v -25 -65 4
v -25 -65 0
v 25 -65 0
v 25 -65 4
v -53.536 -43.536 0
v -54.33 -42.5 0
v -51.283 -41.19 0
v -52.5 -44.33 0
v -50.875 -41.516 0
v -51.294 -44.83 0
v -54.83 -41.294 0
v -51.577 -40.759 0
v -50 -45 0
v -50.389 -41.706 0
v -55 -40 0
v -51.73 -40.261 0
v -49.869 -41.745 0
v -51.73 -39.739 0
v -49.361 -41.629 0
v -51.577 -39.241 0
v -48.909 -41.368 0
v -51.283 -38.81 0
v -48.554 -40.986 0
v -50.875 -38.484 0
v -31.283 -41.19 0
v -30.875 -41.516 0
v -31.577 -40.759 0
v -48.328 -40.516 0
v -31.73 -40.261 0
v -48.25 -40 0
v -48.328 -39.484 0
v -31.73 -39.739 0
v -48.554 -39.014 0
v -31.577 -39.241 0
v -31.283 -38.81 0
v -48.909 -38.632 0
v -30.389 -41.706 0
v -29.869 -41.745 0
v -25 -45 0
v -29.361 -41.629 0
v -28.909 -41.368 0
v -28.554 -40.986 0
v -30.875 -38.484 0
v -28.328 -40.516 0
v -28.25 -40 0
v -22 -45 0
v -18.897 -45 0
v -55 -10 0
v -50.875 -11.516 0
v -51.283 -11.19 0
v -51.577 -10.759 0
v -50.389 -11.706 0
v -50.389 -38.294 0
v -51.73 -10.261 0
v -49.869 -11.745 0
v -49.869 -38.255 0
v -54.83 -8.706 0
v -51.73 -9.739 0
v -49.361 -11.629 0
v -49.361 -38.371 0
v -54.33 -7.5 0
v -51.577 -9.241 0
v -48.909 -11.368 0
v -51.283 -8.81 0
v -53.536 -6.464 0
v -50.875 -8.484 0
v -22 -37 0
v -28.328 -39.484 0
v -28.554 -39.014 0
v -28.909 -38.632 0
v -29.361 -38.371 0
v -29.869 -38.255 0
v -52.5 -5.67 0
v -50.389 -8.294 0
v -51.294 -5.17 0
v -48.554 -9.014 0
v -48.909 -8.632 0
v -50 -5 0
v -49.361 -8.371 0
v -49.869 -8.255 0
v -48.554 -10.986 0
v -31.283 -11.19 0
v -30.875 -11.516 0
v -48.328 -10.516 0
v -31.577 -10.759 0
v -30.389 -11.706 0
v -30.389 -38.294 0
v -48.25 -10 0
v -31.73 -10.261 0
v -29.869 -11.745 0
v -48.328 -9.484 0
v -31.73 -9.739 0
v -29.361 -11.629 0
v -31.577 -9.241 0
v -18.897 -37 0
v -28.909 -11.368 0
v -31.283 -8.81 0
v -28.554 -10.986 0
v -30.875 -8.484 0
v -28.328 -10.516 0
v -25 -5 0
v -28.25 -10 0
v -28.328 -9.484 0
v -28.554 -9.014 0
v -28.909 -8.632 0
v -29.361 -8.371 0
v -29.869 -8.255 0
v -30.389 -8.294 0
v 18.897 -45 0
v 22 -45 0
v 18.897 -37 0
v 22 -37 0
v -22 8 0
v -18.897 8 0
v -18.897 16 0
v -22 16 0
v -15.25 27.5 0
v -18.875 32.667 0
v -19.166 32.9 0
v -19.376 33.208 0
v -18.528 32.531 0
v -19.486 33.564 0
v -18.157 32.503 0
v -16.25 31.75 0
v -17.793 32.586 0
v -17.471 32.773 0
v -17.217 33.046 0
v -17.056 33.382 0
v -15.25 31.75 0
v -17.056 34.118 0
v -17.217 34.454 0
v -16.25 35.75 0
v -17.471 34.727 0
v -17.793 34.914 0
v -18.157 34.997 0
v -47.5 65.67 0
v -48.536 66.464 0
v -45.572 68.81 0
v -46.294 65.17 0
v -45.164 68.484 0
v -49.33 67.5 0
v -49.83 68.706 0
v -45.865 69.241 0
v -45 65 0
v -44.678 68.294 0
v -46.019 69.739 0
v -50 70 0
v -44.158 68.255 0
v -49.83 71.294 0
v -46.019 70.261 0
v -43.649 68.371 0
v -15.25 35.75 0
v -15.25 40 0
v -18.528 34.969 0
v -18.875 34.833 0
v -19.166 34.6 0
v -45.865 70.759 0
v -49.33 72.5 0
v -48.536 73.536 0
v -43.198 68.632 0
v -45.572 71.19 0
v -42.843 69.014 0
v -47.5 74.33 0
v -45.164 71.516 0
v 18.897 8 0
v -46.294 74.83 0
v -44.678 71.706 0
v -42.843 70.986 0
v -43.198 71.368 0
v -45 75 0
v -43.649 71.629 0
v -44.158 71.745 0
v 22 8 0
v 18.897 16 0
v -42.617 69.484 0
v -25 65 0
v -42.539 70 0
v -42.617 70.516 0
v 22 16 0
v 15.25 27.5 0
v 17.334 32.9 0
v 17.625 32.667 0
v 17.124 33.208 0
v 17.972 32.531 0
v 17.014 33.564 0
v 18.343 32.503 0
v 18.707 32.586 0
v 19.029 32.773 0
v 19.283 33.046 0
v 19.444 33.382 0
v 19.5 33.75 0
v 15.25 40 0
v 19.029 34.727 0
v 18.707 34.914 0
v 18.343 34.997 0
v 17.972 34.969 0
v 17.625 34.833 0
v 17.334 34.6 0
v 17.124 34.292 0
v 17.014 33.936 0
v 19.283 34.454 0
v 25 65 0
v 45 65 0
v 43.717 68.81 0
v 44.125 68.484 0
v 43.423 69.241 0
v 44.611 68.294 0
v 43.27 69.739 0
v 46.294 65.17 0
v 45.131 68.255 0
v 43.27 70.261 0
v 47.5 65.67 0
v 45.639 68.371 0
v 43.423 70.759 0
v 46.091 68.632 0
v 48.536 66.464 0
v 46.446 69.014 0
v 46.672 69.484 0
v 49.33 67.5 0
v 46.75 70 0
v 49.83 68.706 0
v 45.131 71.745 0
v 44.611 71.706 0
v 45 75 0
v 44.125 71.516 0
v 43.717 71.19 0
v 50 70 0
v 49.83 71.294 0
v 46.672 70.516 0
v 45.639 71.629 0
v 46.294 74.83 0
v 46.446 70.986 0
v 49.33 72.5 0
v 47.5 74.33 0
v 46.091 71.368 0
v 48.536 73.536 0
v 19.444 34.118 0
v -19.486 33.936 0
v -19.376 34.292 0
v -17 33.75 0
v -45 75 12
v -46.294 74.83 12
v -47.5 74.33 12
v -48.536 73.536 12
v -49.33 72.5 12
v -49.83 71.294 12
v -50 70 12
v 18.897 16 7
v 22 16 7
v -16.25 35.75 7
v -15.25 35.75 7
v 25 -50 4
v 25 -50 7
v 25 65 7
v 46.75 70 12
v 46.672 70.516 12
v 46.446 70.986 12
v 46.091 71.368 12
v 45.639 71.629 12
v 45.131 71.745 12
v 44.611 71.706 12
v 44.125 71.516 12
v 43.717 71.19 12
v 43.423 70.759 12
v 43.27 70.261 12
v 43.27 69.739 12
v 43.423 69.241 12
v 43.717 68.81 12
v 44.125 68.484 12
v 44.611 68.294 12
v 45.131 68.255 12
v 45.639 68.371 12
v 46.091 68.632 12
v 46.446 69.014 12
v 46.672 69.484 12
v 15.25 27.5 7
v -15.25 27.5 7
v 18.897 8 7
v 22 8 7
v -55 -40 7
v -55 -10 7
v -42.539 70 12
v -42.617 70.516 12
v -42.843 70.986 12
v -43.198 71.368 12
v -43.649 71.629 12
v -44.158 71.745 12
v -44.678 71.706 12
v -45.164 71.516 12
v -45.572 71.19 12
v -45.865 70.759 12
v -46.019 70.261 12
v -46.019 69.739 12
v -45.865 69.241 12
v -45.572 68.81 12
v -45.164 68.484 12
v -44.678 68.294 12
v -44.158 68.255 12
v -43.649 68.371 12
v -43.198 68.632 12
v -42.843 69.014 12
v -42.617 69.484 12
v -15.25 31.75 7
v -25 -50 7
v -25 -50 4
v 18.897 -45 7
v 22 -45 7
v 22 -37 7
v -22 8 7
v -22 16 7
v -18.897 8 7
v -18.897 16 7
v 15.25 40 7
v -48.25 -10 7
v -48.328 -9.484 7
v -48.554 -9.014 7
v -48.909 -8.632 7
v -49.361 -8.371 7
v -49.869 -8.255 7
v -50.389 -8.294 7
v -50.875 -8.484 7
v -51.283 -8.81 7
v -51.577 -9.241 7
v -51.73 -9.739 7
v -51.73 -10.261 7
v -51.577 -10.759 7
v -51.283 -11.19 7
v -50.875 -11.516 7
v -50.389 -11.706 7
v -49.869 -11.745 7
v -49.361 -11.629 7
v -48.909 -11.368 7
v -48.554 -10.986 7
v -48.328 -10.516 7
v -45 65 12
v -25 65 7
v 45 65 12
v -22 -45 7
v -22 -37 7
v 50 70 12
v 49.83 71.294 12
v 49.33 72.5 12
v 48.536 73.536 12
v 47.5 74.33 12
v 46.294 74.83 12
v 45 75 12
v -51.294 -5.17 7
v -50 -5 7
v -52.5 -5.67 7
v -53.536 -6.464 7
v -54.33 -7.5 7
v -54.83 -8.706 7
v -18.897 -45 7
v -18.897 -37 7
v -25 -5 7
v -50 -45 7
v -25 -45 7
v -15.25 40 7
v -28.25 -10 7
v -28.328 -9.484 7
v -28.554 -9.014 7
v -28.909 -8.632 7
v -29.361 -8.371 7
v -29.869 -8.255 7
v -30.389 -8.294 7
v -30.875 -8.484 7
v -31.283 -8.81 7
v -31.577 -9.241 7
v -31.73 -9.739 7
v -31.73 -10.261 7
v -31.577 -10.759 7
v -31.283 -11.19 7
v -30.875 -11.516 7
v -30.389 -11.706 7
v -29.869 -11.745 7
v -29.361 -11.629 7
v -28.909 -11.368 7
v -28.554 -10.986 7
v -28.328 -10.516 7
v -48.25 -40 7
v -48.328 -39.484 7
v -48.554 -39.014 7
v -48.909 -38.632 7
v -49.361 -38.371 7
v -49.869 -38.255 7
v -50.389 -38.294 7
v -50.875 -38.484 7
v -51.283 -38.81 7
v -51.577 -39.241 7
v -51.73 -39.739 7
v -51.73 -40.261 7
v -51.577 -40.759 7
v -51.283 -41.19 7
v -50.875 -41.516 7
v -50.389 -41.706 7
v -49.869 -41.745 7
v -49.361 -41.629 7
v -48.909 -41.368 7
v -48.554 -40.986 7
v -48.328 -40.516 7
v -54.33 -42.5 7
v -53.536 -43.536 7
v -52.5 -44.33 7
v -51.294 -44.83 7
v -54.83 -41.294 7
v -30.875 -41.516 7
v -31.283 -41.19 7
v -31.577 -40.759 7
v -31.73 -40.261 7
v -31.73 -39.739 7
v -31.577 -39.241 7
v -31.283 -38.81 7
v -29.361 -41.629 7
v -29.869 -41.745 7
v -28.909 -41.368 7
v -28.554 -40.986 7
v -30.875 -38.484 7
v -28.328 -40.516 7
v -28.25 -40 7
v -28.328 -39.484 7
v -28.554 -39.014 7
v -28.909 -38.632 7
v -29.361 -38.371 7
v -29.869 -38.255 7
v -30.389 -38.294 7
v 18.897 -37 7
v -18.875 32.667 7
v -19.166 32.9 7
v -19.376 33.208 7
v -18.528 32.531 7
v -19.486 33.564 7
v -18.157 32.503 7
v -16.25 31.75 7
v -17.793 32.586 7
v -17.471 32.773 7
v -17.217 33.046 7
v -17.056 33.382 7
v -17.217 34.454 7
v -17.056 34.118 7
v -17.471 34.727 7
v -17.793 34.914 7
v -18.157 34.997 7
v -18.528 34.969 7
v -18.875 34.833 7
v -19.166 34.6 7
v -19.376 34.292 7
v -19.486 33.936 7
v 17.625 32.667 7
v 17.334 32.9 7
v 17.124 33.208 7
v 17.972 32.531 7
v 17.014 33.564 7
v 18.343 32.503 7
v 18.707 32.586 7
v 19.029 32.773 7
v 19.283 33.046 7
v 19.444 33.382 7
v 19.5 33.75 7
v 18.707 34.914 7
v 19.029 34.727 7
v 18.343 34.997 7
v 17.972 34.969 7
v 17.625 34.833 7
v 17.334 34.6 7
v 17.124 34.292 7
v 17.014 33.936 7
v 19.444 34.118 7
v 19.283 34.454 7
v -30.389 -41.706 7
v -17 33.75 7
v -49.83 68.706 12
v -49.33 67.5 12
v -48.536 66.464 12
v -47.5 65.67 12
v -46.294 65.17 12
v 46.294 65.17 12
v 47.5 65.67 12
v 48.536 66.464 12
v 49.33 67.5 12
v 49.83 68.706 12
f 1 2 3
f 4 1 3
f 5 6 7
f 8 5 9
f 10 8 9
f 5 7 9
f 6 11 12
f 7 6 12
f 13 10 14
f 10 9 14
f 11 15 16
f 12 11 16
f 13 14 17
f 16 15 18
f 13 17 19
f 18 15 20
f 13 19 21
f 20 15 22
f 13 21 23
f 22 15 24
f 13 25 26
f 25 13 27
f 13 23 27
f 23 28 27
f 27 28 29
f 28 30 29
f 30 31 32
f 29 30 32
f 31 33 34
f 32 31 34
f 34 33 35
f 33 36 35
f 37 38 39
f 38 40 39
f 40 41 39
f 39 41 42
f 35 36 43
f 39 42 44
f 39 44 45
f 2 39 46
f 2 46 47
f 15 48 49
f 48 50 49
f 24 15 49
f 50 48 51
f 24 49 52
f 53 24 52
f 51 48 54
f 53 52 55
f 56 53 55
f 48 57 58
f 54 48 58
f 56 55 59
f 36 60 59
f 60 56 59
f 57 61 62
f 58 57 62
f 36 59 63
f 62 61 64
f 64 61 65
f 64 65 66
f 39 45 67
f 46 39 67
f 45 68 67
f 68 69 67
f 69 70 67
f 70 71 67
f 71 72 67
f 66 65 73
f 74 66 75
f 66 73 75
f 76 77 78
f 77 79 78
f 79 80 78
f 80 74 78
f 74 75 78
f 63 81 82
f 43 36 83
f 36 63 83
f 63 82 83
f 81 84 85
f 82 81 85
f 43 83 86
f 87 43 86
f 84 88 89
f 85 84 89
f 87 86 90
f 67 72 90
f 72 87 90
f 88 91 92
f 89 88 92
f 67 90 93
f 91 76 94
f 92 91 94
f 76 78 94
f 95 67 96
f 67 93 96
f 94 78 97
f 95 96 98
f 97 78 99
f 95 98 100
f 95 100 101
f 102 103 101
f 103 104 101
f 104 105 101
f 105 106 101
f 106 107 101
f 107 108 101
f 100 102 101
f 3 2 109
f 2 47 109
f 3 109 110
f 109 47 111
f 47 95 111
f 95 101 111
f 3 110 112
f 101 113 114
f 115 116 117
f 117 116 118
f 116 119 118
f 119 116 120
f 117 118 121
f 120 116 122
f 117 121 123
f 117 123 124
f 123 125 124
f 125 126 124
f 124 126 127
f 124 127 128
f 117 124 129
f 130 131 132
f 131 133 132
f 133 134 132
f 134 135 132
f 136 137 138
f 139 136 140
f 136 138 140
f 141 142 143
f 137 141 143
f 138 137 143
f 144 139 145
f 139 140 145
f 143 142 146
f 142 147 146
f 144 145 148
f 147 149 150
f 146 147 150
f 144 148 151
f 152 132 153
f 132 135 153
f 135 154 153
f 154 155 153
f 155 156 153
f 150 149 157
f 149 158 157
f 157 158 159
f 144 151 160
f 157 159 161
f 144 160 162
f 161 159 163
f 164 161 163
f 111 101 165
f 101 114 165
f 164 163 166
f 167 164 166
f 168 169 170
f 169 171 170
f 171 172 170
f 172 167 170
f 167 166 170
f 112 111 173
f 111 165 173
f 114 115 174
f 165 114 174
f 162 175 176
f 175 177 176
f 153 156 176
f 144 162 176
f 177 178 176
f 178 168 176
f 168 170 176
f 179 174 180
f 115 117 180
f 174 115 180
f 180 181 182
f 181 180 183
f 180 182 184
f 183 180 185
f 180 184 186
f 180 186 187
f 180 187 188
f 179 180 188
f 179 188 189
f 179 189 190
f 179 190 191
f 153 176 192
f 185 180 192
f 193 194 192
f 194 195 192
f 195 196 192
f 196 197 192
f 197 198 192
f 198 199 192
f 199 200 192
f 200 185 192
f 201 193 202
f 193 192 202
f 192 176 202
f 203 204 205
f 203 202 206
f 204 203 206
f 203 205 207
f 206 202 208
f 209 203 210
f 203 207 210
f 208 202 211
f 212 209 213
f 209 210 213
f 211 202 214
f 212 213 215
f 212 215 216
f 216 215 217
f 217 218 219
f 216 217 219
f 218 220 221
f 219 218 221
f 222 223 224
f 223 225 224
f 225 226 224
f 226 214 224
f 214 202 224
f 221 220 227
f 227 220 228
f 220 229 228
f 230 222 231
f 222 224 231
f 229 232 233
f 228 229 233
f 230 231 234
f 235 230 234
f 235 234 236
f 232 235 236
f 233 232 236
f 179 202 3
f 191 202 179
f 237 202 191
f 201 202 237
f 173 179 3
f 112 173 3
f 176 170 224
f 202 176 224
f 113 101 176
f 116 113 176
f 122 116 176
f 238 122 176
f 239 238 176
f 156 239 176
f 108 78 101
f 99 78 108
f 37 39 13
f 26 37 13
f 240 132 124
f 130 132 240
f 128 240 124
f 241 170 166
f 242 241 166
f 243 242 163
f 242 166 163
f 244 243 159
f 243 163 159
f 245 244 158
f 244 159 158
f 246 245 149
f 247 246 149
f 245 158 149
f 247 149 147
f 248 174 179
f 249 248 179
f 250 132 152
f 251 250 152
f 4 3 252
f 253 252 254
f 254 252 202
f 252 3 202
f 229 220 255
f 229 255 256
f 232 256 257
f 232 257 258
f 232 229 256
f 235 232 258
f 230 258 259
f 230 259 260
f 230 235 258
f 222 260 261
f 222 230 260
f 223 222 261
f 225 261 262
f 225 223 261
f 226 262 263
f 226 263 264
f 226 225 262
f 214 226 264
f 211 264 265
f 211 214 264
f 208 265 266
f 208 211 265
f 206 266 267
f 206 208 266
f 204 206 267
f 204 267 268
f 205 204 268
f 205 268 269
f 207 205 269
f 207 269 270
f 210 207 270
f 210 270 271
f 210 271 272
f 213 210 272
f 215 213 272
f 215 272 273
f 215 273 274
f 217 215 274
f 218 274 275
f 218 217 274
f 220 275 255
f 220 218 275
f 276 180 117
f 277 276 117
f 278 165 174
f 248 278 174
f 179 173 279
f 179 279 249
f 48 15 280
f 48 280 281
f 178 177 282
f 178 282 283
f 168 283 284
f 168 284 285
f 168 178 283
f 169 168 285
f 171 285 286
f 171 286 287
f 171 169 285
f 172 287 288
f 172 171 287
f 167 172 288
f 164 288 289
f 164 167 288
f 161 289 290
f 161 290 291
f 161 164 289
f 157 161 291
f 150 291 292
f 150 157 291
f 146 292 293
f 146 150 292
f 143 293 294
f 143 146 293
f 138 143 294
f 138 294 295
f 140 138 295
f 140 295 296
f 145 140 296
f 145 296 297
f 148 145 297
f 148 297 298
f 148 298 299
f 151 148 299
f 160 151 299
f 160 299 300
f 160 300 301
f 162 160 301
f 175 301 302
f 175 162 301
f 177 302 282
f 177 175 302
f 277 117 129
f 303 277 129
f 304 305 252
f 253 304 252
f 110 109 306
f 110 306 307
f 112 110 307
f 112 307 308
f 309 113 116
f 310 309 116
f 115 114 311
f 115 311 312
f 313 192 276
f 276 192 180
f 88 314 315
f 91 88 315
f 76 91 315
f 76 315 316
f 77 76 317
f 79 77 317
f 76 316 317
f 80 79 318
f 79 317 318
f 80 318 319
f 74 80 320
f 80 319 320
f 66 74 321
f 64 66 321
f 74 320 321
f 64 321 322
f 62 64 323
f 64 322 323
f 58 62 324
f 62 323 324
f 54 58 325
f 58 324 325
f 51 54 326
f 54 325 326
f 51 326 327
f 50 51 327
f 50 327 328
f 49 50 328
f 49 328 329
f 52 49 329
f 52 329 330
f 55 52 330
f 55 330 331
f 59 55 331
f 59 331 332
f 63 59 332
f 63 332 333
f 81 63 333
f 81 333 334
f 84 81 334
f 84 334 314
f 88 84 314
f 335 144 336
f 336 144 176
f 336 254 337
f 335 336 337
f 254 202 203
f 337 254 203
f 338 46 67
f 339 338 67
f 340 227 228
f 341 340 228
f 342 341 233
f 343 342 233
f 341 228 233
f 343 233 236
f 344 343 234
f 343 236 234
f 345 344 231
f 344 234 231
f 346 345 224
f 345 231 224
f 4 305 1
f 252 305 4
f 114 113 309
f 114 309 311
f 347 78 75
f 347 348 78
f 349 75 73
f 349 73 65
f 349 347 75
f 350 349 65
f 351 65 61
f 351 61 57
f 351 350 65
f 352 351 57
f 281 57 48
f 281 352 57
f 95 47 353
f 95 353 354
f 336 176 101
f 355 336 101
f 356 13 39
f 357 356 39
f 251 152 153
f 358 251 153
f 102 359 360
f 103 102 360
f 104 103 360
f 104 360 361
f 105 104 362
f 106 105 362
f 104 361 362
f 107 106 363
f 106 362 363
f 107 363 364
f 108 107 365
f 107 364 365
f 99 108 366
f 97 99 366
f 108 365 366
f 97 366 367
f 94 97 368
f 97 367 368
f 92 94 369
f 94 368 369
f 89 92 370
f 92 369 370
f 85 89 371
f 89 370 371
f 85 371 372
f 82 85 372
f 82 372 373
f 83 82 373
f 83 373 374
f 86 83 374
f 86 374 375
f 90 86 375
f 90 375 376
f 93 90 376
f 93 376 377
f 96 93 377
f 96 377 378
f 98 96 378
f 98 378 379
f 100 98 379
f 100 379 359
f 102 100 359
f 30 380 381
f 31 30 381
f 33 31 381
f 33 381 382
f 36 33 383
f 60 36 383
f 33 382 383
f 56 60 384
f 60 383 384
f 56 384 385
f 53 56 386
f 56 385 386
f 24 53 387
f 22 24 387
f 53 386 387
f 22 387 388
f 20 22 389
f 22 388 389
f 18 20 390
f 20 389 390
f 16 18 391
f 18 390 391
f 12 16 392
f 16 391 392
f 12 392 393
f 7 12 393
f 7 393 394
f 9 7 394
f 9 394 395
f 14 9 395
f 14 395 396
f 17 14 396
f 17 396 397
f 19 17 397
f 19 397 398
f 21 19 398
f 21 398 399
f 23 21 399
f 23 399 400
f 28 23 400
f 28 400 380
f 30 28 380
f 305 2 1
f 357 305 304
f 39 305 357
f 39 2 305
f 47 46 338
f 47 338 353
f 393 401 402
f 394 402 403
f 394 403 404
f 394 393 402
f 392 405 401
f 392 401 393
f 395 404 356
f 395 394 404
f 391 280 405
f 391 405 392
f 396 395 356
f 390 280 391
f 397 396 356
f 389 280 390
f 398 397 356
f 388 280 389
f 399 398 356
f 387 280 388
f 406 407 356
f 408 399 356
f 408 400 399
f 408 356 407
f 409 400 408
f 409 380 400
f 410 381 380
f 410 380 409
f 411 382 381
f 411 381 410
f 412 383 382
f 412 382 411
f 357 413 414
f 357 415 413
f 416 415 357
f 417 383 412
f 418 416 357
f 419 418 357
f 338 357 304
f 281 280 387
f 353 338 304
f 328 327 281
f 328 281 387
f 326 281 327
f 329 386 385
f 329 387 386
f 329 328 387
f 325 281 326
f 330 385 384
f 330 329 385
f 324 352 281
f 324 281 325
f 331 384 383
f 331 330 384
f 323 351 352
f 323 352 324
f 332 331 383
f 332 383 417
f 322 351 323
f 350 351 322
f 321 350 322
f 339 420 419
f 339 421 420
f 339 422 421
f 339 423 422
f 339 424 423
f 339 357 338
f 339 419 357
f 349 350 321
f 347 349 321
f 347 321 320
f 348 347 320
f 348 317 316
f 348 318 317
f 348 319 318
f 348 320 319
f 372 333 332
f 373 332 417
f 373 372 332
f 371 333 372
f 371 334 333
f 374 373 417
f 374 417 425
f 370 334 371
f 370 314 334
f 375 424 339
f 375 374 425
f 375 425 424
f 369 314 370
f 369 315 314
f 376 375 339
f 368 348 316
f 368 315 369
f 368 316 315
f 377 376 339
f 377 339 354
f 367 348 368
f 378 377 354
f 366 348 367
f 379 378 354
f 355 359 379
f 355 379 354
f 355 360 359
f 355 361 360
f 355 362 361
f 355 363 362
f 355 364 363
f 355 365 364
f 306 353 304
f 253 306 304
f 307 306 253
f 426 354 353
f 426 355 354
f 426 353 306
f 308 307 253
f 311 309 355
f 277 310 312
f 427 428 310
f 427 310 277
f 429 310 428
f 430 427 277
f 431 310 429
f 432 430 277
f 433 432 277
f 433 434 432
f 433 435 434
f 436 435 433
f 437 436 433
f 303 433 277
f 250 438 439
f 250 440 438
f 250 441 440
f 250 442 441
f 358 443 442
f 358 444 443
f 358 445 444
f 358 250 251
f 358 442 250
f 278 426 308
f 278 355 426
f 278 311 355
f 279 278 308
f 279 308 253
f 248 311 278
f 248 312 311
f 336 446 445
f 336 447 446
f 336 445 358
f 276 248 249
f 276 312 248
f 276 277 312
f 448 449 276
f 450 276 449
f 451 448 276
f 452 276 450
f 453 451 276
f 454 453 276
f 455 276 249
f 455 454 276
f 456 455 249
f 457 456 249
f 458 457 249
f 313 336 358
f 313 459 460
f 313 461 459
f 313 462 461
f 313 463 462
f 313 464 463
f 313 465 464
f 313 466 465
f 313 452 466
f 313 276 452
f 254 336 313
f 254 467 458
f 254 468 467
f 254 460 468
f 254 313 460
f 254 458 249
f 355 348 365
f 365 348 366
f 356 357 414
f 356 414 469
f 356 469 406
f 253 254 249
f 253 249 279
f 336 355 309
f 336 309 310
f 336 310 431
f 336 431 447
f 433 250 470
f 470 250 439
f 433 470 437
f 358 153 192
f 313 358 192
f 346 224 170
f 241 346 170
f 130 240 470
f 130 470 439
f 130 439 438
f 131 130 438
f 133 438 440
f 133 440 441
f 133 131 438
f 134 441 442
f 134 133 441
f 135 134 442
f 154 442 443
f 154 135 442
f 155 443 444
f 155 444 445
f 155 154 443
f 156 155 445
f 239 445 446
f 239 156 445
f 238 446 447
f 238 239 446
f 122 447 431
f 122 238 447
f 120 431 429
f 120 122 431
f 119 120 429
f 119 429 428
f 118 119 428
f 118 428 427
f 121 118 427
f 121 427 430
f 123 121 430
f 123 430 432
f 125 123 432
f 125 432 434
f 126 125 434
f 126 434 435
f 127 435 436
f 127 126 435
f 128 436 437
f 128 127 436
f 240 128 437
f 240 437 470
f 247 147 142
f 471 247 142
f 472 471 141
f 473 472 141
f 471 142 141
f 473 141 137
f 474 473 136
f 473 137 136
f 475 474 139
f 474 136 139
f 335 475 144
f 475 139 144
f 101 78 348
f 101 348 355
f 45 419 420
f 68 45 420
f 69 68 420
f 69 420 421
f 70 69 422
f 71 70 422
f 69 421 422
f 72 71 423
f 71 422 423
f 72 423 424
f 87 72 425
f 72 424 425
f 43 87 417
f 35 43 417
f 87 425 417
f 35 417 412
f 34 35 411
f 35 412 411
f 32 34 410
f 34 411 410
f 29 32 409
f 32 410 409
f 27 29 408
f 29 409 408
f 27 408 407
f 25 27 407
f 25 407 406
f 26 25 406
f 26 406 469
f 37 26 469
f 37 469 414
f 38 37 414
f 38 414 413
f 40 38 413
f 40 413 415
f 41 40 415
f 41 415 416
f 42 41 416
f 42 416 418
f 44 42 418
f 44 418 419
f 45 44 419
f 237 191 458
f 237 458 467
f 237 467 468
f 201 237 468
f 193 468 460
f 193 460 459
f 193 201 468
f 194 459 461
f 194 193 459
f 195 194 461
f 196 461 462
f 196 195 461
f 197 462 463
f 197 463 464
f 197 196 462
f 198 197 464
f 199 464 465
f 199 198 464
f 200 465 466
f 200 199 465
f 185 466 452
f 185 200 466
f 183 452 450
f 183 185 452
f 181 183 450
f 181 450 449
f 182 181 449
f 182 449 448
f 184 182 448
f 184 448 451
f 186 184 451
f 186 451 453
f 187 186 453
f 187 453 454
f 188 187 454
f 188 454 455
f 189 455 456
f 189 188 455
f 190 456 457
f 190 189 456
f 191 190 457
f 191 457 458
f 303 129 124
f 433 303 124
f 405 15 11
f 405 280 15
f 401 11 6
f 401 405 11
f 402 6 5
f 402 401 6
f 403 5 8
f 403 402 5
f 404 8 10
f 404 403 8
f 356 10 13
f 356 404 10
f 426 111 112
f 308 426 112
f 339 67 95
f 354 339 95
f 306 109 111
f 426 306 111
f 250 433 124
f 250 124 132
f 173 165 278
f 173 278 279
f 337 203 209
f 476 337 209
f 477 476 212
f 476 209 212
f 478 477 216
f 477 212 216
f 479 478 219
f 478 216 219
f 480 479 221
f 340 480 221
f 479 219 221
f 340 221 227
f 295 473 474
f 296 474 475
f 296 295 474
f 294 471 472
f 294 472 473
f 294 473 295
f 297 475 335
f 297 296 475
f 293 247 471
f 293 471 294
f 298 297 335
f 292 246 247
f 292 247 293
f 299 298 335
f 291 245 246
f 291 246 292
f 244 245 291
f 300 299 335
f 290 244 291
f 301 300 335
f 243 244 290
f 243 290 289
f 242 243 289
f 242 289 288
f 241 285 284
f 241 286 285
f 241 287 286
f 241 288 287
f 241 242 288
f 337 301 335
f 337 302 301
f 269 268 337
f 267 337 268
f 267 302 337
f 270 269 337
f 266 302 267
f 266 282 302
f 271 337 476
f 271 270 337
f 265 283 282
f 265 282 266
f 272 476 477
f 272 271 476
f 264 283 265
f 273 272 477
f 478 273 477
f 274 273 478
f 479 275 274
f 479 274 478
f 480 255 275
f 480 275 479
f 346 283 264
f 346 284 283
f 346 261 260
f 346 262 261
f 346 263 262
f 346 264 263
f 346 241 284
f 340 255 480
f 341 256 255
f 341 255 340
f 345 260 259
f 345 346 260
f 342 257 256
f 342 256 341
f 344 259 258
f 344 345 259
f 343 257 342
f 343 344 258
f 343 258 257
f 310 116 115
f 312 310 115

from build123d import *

# Parameters (mm, degrees)
F0_W     = 3.1029209495
F0_H     = 8
F0_R     = 1.25
F1_DEPTH = 7
F0_R_2   = 1.75
F2_DEPTH = 12
F0_W_2   = 30
F0_H_2   = 40
F3_DEPTH = 7
F4_R     = 5
F5_R     = 1.75
F6_DEPTH = 25
F0_W_3   = 50
F0_H_3   = 15
F7_DEPTH = 4


with BuildPart() as f1:
    # F0 (on Top) → F1 (new body)
    with BuildSketch(Plane.XY):
        Polygon((25, -50), (25, 65), (-25, 65), (-25, -5), (-25, -45), (-25, -50), align=None)
        with Locations((-20.4485395253, -41)):
            Rectangle(F0_W, F0_H, mode=Mode.SUBTRACT)
        with Locations((20.4485395253, -41)):
            Rectangle(F0_W, F0_H, mode=Mode.SUBTRACT)
        with Locations((-20.4485395253, 12)):
            Rectangle(F0_W, F0_H, mode=Mode.SUBTRACT)
        with Locations((-18.25, 33.75)):
            Circle(F0_R, mode=Mode.SUBTRACT)
        with Locations((20.4485395253, 12)):
            Rectangle(F0_W, F0_H, mode=Mode.SUBTRACT)
        Polygon((15.25, 40), (15.25, 27.5), (-15.25, 27.5), (-15.25, 31.75), (-16.25, 31.75), (-16.25, 35.75), (-15.25, 35.75), (-15.25, 40), align=None, mode=Mode.SUBTRACT)
        with Locations((18.25, 33.75)):
            Circle(F0_R, mode=Mode.SUBTRACT)
    extrude(amount=F1_DEPTH)

    # F0 (on Top) → F2 (join)
    with BuildSketch(Plane.XY):
        with BuildLine():
            Line((-25, 65), (25, 65))
            Line((25, 65), (45, 65))
            ThreePointArc((45, 65), (48.5355339059, 66.4644660941), (50, 70))
            ThreePointArc((50, 70), (48.5355339059, 73.5355339059), (45, 75))
            Line((45, 75), (-45, 75))
            ThreePointArc((-45, 75), (-48.5355339059, 73.5355339059), (-50, 70))
            ThreePointArc((-50, 70), (-48.5355339059, 66.4644660941), (-45, 65))
            Line((-45, 65), (-25, 65))
        make_face()
        with Locations((-44.2887660861, 70)):
            Circle(F0_R_2, mode=Mode.SUBTRACT)
        with Locations((45, 70)):
            Circle(F0_R_2, mode=Mode.SUBTRACT)
    extrude(amount=F2_DEPTH)

    # F0 (on Top) → F3 (join)
    with BuildSketch(Plane.XY):
        with Locations((-40, -25)):
            Rectangle(F0_W_2, F0_H_2)
    extrude(amount=F3_DEPTH)

    # F4
    f4_edges = [f1.edges().sort_by_distance(p)[0] for p in [
        (-55, -5, 3.5),
        (-55, -45, 3.5),
    ]]
    fillet(f4_edges, radius=F4_R)

    # F5 (on face) → F6 (cut)
    with BuildSketch(Plane.XY.offset(7)):
        with Locations((-50, -10)):
            Circle(F5_R)
        with Locations((-30, -10)):
            Circle(F5_R)
        with Locations((-30, -40)):
            Circle(F5_R)
        with Locations((-50, -40)):
            Circle(F5_R)
    extrude(amount=-F6_DEPTH, mode=Mode.SUBTRACT)

    # F0 (on Top) → F7 (join)
    with BuildSketch(Plane.XY):
        with Locations((0, -57.5)):
            Rectangle(F0_W_3, F0_H_3)
    extrude(amount=F7_DEPTH)


solid = f1.part
